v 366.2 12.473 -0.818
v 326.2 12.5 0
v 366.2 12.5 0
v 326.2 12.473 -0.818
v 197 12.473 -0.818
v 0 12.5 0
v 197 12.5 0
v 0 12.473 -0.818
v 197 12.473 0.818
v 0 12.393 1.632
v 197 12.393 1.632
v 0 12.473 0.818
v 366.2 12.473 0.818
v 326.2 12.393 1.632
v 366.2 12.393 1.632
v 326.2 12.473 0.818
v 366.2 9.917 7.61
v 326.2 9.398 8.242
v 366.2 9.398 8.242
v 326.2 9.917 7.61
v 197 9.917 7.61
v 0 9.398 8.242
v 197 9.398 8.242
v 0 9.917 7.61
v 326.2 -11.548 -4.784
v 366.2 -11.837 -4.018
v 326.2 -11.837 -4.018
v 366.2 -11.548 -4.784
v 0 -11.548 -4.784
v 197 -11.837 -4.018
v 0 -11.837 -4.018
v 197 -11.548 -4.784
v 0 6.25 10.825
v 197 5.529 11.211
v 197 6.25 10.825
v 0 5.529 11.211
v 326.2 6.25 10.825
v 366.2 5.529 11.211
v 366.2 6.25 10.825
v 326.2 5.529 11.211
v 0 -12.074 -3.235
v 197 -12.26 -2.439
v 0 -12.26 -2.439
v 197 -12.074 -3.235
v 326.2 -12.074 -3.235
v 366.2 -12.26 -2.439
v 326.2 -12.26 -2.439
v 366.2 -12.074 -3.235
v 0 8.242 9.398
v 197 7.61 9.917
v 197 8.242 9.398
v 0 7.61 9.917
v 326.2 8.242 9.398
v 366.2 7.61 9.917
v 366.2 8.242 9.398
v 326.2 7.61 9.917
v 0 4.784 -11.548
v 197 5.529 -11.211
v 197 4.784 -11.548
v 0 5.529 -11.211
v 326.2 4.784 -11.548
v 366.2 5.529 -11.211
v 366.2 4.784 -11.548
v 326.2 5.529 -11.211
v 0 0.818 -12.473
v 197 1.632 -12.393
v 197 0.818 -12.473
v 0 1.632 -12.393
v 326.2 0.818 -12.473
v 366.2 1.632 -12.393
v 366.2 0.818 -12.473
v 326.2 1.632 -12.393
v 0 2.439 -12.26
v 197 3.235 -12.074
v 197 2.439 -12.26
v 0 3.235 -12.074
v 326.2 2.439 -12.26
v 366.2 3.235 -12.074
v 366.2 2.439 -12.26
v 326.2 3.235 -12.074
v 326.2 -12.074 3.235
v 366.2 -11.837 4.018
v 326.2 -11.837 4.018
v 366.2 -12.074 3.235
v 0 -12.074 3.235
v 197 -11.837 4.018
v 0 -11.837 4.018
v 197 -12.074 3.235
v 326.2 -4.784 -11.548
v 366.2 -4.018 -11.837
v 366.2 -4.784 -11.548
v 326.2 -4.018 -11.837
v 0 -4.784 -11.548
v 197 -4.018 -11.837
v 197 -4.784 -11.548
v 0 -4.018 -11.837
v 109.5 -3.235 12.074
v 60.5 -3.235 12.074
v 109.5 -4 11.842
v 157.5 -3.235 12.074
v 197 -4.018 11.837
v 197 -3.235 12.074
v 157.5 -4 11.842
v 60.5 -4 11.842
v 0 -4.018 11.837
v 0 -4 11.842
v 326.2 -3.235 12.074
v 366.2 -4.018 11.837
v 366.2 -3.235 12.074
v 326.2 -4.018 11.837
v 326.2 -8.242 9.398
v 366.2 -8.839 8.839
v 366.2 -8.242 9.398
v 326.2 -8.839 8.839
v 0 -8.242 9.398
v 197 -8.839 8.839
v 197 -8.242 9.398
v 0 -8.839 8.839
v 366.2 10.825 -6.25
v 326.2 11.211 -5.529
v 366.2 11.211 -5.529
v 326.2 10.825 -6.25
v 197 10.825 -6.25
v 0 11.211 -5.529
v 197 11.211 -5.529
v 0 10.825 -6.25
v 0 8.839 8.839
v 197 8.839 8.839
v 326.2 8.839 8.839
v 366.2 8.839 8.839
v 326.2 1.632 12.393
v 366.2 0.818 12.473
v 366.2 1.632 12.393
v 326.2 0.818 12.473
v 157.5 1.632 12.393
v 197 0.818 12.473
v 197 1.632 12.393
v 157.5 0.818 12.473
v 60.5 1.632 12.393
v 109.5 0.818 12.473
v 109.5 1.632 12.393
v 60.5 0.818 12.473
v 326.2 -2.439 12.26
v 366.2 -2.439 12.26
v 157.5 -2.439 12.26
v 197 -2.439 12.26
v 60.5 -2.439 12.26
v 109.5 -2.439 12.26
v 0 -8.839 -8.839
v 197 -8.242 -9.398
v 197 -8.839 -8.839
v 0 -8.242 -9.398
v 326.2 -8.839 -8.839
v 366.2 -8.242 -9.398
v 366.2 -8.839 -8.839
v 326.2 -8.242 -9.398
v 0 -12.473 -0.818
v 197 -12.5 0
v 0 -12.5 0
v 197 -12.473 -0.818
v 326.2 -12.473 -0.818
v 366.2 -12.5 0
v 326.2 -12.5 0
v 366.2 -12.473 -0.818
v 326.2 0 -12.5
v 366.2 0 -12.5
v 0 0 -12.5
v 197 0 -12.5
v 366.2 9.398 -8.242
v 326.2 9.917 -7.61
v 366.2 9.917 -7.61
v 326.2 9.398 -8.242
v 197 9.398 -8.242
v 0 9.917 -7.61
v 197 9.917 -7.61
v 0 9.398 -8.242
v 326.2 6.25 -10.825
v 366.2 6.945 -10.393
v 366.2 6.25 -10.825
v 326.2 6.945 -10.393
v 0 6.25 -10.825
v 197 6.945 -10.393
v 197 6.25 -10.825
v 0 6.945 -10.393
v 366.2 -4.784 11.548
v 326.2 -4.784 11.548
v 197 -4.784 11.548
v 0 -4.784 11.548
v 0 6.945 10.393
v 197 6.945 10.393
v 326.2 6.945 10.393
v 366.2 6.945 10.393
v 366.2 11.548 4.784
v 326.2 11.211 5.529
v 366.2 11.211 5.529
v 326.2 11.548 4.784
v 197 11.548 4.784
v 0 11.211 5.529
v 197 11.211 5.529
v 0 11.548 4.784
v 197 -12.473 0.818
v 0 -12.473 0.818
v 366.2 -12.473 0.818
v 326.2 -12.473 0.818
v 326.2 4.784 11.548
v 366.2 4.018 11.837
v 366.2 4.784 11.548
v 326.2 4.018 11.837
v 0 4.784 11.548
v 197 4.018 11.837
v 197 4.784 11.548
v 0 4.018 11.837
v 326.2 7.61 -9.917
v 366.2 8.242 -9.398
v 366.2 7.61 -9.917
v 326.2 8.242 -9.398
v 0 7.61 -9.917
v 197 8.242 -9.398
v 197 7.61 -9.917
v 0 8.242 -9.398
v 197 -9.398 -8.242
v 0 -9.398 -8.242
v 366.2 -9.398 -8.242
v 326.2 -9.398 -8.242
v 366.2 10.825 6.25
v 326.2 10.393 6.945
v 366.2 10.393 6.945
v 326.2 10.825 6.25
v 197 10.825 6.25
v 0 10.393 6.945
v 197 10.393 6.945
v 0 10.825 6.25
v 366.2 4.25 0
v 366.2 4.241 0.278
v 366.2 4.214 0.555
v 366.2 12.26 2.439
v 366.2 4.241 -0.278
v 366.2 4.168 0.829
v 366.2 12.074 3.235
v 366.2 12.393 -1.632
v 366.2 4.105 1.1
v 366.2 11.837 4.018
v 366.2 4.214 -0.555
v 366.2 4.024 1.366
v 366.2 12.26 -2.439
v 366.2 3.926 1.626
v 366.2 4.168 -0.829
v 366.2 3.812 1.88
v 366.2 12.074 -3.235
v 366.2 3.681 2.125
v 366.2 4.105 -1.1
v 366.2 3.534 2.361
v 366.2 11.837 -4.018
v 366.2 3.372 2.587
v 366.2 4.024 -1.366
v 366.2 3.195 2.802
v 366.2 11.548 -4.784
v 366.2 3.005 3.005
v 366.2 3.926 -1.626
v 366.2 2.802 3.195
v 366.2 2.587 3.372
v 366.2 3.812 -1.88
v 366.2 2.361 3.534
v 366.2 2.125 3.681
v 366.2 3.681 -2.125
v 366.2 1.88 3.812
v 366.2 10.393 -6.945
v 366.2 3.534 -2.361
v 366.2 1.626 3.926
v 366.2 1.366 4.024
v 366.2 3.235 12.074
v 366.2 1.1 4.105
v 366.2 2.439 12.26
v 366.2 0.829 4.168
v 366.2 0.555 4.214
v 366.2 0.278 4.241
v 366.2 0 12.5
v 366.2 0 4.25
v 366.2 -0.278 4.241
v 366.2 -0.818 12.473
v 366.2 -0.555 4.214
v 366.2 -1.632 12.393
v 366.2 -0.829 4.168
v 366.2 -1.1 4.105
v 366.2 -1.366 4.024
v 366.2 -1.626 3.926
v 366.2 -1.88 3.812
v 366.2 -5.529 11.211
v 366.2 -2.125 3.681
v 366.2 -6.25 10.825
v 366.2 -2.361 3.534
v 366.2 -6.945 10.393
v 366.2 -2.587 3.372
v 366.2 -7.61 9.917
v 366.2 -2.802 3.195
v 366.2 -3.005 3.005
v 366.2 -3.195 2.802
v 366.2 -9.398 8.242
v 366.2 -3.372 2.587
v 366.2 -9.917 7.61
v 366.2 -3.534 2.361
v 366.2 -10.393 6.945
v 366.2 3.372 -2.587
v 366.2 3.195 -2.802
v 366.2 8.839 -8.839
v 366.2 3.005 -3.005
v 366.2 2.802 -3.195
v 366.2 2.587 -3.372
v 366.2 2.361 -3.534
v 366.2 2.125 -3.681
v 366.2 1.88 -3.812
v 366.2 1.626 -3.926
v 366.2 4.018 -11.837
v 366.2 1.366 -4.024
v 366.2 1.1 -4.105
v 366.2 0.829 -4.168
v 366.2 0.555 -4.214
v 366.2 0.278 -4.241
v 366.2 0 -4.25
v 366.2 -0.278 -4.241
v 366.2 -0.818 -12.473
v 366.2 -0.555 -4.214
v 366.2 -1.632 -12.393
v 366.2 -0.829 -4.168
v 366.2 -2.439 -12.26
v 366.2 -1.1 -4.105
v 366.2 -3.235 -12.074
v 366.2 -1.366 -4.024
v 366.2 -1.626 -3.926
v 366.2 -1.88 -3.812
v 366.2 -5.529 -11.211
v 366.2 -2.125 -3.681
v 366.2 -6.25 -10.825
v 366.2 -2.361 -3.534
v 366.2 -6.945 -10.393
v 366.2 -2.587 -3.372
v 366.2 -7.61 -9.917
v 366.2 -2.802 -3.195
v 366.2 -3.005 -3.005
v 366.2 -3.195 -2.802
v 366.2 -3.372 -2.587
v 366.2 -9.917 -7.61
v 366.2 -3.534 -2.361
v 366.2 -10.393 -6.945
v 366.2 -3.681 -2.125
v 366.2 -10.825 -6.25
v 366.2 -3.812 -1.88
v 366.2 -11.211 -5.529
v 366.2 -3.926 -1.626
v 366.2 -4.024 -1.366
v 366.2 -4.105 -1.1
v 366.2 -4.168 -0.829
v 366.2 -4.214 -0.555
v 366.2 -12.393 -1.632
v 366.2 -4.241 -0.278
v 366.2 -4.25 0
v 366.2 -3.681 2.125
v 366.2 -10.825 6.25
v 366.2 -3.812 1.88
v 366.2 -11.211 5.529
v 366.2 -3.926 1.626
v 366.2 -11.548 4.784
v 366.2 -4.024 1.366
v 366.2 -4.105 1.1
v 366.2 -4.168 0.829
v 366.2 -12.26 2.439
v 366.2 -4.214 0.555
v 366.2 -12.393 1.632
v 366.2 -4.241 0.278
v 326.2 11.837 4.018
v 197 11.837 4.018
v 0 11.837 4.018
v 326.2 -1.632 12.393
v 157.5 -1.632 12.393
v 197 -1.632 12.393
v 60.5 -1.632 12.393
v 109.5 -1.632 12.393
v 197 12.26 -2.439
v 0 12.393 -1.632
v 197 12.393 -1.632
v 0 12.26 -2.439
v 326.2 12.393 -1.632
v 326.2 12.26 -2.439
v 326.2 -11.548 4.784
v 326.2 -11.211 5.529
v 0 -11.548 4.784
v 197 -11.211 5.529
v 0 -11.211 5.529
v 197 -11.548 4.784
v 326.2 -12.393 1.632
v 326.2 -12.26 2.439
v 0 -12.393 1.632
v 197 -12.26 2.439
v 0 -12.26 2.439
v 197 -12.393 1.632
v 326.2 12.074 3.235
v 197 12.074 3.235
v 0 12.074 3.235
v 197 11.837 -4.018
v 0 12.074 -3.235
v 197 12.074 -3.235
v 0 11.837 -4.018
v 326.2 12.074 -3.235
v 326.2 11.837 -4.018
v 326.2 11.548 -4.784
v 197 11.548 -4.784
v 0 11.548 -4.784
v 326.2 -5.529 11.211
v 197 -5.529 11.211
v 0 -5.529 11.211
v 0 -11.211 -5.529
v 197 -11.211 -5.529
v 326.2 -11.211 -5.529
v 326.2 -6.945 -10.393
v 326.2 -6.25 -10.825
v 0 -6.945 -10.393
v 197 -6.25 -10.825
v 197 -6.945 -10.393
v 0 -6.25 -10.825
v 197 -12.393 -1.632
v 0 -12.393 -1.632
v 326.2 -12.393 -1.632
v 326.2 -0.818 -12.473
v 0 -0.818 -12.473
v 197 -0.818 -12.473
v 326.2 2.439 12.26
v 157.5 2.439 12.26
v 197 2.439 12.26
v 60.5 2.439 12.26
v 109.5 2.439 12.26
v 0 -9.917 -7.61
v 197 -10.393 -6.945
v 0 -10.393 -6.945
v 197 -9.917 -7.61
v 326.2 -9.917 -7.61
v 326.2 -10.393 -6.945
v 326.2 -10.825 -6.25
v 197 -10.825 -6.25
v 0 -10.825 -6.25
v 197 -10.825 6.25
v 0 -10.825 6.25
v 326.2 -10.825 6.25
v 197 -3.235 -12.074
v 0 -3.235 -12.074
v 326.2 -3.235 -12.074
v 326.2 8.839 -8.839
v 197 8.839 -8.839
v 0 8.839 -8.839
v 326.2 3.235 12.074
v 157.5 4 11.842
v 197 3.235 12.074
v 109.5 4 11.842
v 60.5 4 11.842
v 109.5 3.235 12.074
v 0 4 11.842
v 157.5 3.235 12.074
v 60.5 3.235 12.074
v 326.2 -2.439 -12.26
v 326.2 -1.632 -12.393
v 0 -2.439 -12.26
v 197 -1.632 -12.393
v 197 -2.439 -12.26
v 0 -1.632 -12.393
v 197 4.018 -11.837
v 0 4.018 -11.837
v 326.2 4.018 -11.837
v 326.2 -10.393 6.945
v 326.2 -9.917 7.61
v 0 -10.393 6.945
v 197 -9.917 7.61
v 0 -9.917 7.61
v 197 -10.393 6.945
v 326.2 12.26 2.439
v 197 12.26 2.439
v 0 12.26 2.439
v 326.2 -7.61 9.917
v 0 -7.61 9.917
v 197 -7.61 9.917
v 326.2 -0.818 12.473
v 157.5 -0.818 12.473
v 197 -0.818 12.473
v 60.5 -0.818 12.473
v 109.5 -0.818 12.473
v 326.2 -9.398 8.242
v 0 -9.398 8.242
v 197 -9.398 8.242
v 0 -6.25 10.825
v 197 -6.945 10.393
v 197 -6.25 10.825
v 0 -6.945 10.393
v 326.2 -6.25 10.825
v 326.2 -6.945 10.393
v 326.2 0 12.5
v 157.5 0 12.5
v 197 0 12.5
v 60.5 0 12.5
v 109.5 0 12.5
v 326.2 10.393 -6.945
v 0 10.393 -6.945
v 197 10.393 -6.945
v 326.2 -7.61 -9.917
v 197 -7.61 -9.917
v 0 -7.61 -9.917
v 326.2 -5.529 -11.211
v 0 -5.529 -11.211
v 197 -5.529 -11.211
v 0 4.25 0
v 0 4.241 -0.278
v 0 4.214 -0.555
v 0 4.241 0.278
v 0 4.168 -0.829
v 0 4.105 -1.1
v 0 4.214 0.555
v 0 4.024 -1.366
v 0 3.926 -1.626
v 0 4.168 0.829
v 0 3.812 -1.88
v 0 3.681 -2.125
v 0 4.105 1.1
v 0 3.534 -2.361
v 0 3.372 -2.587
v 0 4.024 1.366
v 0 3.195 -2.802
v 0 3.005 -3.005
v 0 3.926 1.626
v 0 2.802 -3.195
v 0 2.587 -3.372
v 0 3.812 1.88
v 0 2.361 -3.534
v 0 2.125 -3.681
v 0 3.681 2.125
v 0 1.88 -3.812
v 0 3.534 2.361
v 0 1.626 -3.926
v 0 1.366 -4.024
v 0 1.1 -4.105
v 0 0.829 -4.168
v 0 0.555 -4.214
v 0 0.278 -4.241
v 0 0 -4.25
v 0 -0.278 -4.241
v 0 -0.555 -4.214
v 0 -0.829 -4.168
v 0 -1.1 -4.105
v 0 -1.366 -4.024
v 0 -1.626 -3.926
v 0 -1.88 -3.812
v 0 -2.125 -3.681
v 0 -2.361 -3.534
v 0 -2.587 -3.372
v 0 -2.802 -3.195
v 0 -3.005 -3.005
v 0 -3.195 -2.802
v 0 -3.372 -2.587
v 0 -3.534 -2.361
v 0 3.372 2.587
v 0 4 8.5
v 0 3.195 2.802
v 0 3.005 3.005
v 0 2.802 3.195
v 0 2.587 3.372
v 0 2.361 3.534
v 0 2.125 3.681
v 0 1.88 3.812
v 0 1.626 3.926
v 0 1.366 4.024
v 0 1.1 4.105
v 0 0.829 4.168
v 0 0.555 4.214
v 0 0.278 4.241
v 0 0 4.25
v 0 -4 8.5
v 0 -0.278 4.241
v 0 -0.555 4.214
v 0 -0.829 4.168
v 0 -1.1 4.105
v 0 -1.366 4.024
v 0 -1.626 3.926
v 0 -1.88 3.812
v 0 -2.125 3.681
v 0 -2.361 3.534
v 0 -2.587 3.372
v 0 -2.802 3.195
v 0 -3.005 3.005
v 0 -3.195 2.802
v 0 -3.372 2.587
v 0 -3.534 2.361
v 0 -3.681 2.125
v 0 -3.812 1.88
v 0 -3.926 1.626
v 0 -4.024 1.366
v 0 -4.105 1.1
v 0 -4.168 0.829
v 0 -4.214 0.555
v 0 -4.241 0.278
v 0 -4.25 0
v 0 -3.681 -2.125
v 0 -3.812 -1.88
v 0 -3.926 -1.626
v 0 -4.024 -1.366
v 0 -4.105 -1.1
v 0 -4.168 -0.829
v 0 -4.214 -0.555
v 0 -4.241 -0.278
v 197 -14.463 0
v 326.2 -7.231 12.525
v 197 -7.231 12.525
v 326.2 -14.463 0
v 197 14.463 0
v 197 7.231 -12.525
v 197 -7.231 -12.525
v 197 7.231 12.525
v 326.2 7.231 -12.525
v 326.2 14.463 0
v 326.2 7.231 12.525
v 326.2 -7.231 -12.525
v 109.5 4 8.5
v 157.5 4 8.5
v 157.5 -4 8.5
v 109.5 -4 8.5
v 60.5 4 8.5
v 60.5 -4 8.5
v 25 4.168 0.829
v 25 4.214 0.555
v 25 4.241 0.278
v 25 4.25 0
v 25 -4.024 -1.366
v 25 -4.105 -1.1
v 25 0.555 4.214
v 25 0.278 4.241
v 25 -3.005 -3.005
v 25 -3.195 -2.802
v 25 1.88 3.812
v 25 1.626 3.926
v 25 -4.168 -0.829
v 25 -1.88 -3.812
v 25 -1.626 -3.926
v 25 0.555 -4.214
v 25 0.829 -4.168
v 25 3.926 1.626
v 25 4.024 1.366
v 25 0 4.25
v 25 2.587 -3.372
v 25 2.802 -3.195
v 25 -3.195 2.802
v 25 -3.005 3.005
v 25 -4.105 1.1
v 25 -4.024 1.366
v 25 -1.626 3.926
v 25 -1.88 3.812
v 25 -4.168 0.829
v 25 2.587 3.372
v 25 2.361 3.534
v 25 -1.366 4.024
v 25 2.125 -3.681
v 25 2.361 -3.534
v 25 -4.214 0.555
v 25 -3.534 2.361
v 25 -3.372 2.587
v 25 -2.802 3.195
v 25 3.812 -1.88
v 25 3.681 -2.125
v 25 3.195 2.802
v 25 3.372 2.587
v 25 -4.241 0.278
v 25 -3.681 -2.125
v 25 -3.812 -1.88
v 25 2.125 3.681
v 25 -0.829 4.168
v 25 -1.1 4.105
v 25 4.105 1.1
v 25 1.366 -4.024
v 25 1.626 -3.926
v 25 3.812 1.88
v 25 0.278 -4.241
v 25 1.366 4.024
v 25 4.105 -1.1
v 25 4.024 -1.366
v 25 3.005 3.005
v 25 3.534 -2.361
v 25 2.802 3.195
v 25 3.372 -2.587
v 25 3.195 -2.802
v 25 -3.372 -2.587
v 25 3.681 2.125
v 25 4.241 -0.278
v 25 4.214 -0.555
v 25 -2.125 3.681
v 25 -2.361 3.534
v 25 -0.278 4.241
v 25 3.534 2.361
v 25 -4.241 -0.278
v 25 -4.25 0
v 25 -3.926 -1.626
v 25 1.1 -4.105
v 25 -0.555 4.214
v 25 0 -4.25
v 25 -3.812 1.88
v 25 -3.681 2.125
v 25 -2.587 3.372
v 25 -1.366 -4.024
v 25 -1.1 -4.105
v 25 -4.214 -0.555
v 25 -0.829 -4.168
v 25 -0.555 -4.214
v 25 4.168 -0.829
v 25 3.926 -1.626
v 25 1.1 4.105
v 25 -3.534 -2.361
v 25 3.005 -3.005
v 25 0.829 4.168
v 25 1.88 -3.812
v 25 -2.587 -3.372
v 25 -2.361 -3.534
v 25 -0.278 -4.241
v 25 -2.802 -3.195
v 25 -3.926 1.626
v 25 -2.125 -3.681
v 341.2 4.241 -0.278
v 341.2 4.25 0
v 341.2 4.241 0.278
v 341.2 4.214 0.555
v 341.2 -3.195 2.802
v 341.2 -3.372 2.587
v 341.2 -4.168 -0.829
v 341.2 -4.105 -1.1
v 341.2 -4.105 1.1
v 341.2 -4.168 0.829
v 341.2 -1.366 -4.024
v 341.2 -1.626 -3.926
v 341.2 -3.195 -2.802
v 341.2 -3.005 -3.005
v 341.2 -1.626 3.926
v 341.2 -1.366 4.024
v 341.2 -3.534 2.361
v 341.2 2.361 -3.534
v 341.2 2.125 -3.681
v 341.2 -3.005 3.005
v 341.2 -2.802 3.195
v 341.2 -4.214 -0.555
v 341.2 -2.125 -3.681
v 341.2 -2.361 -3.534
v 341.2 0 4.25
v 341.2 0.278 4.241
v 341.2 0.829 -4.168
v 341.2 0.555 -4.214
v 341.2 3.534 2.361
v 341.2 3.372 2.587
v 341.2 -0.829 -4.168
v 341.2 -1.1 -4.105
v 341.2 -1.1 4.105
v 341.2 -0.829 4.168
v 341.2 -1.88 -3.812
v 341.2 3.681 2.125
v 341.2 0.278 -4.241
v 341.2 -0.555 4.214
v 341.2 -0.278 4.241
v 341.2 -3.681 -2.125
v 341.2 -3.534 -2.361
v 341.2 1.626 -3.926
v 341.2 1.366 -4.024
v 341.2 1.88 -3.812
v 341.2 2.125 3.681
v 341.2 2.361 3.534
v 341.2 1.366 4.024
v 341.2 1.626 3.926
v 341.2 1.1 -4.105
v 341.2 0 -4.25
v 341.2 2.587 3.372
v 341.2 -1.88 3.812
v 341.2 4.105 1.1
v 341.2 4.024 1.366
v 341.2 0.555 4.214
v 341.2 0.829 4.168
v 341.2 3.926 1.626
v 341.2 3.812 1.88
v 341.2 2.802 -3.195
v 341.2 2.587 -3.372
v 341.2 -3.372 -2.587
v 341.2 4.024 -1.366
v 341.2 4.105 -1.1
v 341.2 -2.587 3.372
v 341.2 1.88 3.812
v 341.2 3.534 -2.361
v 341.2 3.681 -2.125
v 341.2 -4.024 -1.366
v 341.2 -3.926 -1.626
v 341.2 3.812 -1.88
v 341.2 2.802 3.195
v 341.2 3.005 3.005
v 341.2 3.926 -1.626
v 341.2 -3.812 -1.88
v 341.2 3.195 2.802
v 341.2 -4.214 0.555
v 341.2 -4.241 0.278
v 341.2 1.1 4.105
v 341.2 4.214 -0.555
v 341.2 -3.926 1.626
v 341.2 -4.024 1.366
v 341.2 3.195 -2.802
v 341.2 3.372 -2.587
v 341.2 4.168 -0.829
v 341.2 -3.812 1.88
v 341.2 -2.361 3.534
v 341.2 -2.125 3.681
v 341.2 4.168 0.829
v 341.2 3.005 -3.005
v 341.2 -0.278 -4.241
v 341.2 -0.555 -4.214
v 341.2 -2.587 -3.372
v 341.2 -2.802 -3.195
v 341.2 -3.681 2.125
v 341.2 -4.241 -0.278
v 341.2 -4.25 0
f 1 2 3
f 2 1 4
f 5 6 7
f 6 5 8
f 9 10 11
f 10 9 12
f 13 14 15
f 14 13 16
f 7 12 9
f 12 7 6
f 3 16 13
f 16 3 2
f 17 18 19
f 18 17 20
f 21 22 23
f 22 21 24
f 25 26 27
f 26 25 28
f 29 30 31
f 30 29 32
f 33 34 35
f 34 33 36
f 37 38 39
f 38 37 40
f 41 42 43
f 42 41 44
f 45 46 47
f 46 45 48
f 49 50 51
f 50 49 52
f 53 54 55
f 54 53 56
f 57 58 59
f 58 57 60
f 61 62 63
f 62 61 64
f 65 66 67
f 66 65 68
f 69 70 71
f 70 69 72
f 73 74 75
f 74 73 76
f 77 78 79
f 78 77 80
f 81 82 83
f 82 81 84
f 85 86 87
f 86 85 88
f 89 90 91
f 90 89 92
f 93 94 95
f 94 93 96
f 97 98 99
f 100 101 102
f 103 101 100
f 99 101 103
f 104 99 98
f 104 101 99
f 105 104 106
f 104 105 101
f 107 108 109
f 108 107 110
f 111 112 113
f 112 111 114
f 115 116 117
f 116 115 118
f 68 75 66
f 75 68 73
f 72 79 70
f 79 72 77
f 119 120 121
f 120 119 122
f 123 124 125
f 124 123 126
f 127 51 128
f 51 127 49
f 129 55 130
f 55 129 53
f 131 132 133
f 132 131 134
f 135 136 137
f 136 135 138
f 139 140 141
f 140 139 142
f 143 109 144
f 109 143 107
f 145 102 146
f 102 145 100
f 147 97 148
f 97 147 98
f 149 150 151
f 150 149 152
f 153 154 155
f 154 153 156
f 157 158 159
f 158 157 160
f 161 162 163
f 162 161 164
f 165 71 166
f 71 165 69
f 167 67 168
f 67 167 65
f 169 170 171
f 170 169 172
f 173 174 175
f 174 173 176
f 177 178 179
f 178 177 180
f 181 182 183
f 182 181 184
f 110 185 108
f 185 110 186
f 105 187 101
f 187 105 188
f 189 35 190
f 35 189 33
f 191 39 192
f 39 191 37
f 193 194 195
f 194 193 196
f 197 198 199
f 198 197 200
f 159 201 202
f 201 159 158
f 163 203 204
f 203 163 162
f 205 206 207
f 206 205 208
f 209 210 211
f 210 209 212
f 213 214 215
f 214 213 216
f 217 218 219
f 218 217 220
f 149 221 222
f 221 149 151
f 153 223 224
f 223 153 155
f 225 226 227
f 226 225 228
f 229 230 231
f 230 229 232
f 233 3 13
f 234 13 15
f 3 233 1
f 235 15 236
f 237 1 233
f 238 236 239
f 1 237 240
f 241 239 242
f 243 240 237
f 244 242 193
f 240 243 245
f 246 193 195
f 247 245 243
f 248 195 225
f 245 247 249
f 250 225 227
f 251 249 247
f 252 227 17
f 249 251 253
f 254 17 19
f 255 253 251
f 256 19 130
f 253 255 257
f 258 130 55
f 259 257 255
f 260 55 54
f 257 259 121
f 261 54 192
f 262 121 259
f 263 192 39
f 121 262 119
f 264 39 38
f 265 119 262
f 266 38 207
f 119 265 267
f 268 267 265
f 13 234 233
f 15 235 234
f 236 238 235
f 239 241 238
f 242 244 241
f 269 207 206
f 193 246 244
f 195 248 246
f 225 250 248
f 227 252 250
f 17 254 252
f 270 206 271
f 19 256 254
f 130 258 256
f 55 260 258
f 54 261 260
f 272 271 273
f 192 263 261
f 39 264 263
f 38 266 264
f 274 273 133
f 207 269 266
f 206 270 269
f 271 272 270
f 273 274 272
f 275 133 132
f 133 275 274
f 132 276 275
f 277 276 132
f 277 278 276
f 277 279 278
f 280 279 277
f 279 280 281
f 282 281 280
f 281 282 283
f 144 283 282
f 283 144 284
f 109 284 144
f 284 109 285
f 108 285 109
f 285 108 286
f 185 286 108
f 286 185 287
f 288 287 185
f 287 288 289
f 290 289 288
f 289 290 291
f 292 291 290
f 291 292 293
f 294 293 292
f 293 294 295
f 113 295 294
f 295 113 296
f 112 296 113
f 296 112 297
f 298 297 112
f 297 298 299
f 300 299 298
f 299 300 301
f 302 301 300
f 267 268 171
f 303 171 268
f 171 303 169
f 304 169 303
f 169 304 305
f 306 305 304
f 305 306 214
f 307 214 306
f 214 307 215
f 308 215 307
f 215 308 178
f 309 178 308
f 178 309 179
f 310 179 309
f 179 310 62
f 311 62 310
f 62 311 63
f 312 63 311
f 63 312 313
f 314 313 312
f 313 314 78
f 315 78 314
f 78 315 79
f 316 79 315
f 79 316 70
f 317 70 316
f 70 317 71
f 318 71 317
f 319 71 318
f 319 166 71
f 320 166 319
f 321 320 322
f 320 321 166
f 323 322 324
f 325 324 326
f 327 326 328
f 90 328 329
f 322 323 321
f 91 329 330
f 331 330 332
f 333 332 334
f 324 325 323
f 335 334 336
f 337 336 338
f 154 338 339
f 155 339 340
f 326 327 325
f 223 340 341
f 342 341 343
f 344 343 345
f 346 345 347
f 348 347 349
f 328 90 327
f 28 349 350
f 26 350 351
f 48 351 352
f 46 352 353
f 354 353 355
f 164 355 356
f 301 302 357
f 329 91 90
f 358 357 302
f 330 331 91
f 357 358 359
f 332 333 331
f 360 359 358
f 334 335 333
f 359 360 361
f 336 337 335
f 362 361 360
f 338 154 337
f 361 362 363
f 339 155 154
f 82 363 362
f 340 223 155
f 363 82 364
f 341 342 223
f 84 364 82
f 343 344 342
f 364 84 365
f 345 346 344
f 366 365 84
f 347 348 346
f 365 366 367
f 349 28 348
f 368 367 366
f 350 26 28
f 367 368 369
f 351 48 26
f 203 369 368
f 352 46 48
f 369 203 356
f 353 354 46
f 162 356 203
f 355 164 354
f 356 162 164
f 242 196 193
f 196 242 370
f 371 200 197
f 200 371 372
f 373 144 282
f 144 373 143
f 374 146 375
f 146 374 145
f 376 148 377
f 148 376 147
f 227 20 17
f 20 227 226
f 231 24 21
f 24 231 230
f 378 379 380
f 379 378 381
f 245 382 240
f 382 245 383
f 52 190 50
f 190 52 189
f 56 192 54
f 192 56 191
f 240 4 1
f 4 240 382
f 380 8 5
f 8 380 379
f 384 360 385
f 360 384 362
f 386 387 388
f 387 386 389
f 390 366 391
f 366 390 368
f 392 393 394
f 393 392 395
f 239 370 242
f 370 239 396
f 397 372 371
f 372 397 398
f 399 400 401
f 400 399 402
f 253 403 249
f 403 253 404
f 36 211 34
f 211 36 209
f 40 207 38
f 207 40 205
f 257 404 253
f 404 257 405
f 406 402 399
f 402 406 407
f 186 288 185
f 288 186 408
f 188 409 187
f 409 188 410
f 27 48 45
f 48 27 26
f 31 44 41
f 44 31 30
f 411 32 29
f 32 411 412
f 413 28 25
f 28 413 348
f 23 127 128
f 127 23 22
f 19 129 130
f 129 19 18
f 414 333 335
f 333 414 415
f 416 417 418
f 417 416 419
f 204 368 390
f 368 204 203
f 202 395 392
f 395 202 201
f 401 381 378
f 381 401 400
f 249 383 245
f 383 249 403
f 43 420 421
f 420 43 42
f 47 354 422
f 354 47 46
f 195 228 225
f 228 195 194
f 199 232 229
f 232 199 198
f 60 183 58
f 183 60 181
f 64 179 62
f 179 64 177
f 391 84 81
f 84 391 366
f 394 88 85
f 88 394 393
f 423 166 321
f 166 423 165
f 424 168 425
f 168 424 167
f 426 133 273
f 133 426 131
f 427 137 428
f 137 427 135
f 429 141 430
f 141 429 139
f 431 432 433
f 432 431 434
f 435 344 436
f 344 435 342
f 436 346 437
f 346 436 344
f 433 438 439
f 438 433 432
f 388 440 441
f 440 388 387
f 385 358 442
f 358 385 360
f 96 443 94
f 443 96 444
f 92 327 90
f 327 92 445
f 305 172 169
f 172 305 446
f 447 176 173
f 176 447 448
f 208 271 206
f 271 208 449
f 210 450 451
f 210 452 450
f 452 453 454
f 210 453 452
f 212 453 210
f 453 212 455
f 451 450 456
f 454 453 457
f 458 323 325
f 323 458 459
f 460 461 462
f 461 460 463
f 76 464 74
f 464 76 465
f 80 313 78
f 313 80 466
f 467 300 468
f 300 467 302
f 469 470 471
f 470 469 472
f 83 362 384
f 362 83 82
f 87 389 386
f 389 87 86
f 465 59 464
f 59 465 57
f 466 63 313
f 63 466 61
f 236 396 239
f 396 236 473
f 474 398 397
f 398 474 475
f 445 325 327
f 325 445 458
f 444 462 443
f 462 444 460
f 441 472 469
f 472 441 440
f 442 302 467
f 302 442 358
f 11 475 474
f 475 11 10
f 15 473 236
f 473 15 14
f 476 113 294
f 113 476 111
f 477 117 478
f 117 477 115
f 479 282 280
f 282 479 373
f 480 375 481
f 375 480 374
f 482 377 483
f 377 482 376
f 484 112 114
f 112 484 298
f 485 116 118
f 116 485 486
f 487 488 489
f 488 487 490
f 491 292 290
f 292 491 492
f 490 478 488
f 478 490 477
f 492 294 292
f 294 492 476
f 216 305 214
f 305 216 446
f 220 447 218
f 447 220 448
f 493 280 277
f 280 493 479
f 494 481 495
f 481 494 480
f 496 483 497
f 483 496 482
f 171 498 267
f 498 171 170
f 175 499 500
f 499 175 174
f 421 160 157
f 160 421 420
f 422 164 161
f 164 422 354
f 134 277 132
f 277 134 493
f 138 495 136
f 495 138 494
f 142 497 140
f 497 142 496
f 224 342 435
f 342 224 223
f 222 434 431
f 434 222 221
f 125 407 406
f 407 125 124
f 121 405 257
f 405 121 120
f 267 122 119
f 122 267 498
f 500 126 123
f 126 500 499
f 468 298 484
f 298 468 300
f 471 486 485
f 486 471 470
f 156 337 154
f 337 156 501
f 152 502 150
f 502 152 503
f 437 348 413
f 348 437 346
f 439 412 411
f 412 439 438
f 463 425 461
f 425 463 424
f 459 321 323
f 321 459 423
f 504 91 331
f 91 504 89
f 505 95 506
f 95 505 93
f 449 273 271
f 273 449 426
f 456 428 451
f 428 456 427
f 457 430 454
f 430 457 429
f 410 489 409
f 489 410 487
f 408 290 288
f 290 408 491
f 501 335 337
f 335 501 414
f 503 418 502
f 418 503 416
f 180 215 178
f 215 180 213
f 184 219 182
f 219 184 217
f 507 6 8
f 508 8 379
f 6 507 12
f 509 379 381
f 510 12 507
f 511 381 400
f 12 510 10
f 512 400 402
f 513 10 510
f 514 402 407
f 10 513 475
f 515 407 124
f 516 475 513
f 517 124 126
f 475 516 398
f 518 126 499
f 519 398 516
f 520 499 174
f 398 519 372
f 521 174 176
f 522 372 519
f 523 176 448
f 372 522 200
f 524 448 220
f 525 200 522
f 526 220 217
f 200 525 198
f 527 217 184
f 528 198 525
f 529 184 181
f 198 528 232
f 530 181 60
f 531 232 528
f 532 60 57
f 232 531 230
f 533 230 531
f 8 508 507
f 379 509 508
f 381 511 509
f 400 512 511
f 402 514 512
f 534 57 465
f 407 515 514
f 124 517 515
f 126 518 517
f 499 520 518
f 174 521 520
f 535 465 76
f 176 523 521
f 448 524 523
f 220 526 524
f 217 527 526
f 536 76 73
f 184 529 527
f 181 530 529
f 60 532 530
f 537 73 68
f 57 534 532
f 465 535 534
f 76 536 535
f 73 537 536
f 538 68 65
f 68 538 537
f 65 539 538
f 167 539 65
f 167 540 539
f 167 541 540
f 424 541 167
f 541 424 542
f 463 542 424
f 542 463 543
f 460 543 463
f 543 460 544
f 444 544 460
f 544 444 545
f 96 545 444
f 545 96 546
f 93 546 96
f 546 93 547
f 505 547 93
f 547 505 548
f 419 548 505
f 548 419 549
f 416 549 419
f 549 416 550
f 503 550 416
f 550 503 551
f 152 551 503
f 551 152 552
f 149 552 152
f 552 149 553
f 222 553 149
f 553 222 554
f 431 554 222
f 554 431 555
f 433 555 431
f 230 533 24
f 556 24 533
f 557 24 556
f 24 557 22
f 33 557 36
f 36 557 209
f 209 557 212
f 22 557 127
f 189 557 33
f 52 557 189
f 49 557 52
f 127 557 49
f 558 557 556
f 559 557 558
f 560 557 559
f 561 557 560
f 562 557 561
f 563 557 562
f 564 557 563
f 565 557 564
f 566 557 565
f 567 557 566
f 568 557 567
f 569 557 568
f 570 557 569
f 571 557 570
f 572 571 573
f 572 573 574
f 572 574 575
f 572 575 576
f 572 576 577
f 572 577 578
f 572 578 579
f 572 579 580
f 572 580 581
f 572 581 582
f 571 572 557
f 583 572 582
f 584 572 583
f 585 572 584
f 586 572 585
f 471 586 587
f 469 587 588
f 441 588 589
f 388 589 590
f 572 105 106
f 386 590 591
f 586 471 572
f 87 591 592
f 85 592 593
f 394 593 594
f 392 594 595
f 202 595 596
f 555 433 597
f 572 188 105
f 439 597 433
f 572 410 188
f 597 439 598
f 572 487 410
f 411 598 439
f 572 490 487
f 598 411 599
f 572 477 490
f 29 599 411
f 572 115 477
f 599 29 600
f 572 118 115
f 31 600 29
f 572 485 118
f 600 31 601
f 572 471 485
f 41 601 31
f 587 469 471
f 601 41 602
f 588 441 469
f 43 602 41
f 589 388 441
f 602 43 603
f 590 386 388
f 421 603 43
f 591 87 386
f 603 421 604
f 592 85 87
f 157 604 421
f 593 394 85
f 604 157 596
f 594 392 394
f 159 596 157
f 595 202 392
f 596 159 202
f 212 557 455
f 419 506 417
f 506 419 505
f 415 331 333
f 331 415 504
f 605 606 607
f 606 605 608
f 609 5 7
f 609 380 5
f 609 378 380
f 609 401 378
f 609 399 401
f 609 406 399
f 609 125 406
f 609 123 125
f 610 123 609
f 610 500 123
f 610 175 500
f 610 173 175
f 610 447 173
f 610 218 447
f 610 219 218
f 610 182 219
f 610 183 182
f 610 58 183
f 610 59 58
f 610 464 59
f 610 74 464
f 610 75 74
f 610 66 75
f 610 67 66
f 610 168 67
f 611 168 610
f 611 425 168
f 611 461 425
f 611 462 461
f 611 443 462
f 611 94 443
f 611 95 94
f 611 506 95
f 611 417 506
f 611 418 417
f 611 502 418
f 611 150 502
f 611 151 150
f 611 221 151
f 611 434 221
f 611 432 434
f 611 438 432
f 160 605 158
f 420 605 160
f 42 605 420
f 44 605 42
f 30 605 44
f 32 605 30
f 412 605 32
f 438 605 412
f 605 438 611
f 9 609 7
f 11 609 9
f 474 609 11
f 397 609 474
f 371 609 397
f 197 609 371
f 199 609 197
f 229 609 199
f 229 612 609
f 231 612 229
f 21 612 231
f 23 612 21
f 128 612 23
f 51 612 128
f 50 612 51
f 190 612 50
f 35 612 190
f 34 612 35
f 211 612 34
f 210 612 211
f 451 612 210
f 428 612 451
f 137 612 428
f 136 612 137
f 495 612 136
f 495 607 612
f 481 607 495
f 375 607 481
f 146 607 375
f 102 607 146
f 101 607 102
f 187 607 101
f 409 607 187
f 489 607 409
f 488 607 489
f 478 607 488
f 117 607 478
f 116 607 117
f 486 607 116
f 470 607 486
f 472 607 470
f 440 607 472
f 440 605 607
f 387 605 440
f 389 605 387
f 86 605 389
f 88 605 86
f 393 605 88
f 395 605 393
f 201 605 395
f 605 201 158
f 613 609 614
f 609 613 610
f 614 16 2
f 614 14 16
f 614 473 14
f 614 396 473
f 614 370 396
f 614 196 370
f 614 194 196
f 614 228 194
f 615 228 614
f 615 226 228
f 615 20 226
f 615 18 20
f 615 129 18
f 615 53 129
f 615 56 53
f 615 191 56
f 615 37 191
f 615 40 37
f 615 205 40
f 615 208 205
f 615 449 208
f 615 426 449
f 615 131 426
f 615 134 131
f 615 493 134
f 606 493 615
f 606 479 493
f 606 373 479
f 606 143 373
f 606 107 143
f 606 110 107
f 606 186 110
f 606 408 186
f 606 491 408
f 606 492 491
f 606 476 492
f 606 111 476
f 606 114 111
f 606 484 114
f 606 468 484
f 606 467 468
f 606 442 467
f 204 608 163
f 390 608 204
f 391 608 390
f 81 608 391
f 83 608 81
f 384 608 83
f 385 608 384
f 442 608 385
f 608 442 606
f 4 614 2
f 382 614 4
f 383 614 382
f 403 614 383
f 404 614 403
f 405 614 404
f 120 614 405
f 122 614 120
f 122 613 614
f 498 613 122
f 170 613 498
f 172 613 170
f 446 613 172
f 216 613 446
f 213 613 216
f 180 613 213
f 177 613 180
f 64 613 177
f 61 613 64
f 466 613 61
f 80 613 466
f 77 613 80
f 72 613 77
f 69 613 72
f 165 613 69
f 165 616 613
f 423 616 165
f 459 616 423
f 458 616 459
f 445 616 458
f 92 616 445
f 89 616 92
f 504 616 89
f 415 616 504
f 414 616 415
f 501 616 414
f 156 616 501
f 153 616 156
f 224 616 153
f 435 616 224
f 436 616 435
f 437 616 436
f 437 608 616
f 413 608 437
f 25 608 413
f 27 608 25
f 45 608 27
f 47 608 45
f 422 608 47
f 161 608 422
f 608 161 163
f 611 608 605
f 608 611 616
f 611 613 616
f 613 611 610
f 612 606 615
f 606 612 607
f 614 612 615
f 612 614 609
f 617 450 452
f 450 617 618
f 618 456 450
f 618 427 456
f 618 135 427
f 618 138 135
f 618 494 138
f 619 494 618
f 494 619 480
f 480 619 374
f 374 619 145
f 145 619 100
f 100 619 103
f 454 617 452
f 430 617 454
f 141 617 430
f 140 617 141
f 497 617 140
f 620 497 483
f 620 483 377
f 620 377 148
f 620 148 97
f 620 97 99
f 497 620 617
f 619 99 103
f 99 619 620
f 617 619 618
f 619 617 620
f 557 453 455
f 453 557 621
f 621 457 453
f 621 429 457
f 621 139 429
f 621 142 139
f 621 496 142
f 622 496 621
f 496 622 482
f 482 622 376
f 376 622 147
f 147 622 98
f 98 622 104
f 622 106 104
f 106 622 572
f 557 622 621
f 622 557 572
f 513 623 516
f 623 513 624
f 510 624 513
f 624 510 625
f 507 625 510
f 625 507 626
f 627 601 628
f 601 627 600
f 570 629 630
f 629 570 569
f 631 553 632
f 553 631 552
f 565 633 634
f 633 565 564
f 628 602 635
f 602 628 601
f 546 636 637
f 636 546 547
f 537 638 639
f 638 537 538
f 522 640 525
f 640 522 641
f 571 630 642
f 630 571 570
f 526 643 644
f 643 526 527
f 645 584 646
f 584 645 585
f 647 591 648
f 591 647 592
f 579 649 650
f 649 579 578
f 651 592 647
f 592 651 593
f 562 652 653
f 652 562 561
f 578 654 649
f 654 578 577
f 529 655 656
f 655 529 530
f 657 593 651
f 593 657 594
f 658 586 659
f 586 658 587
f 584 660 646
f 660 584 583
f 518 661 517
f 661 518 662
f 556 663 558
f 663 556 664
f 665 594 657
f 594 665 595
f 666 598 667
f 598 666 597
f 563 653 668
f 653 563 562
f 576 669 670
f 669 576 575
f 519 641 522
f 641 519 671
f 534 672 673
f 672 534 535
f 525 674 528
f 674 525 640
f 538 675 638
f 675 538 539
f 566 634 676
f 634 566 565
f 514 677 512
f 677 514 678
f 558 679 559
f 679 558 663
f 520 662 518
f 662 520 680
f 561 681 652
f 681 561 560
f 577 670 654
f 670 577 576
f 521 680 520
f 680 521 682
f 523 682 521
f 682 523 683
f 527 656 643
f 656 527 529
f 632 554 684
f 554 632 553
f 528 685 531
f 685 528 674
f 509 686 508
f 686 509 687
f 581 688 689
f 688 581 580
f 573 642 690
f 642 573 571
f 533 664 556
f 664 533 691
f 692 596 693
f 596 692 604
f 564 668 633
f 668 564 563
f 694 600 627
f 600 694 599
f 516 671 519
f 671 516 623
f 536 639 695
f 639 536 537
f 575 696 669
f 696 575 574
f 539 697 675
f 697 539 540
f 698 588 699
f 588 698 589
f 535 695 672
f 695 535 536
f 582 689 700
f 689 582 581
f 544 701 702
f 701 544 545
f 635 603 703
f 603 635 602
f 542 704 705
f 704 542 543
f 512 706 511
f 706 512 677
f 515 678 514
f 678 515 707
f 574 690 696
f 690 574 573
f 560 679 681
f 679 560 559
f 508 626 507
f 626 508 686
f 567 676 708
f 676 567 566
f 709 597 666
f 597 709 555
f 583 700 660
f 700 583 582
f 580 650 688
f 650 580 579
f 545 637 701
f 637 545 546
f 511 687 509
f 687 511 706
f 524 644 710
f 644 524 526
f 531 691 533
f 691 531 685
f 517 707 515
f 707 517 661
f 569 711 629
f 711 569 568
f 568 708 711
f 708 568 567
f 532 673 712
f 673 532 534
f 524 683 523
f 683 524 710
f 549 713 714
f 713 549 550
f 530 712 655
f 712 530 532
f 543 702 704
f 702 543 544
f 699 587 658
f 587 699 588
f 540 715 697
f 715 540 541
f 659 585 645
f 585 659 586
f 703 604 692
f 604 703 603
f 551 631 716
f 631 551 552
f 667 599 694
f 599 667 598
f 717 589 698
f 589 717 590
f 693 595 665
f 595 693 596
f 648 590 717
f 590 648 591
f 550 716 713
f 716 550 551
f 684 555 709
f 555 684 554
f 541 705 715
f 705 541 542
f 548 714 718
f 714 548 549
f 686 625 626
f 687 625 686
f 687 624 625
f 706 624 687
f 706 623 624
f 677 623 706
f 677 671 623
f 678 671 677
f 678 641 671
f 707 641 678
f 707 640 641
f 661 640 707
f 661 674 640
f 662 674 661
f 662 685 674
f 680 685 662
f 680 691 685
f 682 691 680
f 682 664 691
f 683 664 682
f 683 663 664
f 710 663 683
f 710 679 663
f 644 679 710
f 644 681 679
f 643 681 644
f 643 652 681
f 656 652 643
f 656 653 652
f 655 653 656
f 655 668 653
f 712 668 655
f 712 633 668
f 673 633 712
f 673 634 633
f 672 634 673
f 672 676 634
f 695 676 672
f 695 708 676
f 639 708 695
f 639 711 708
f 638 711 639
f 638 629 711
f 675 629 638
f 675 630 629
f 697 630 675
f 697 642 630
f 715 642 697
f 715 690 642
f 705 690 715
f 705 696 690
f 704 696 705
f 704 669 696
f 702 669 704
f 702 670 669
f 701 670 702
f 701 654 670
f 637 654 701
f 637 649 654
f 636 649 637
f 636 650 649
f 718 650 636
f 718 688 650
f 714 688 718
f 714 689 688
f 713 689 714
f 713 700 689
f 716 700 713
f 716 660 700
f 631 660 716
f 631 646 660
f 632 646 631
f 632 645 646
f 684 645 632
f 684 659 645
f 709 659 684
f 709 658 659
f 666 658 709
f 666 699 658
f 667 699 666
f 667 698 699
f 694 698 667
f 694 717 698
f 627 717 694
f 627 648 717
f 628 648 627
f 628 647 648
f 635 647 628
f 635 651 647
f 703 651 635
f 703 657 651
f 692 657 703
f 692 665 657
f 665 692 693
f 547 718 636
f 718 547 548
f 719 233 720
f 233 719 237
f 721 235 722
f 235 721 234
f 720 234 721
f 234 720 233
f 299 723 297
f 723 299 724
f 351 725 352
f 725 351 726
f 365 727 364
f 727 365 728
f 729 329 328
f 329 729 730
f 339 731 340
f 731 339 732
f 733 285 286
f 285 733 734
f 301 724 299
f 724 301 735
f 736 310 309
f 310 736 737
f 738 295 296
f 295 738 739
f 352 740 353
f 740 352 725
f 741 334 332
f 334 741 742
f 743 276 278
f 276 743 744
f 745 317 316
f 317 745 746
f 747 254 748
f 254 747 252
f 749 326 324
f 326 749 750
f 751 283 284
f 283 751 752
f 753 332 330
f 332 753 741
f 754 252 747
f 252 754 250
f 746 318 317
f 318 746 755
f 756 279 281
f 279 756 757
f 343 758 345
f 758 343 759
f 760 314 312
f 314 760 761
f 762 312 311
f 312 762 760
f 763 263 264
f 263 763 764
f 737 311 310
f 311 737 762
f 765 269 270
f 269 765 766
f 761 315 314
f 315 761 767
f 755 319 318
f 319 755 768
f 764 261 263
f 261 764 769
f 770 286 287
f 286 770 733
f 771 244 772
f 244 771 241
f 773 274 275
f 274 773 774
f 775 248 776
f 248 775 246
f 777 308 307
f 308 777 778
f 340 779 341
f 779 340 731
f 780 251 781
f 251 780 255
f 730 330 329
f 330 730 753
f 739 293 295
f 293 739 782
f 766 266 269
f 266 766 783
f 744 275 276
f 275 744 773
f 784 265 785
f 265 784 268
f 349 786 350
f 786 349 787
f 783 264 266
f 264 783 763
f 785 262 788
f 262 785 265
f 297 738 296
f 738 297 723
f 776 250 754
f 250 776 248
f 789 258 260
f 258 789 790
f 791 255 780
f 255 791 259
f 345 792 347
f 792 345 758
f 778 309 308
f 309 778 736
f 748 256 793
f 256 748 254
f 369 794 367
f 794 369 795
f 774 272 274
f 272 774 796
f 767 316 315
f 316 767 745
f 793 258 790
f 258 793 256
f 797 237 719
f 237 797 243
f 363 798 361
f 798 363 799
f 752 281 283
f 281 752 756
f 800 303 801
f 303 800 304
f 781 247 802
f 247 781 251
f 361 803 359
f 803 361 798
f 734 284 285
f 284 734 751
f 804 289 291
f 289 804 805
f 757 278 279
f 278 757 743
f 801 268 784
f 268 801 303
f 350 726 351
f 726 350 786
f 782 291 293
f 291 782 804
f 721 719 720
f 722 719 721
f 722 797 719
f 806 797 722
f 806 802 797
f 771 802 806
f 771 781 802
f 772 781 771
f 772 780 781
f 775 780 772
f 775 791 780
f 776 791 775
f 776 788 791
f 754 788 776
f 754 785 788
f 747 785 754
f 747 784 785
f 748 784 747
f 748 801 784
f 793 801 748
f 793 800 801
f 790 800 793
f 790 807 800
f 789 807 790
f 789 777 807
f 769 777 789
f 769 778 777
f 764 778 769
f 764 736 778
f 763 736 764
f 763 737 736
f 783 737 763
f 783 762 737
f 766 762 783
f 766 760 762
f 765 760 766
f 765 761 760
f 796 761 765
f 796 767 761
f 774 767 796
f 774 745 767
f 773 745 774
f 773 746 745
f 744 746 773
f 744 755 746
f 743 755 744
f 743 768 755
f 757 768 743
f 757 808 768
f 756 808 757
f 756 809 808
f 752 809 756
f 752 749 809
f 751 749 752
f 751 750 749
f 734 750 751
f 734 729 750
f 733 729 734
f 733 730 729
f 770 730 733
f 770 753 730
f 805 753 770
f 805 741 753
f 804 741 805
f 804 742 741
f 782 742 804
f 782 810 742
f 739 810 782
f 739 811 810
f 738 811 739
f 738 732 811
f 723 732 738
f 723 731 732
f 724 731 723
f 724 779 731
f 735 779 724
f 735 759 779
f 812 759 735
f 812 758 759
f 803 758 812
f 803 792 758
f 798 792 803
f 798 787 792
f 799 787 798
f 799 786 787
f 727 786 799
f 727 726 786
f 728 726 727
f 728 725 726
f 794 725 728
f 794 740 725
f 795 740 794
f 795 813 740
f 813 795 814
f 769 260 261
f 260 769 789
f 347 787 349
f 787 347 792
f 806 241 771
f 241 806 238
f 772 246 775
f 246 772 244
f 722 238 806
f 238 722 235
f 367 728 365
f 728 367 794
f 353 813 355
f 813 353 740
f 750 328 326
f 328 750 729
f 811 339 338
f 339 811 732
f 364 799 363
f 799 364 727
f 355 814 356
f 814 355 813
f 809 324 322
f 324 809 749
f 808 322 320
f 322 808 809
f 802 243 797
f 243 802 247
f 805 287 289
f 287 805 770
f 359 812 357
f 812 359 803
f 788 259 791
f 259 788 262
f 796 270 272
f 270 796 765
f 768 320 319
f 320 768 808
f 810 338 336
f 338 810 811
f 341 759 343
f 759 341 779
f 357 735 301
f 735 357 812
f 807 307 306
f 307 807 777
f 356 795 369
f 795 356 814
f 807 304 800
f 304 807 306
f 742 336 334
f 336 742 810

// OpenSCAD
// file: params.scad
// GENERATED by design/build.py from design/params.py -- do not edit by hand.

C = 60.0;
N_SLOTS = 16.0;
T_BLADE = 8.0;
SIDE_CLEAR = 0.2;
T_SPACER = 8.4;
END_CLEAR = 0.5;
R_TIP = 34.0;
R_ROOT = 25.0;
TEETH = 3.0;
STAGGER_DEG = 15.0;
BLADE_VARIANTS = 4.0;
SPACER_OD = 50.0;
SPACER_BORE = 29.2;
HEX_AF = 25.05;
HEX_BORE_AF = 25.1;
HEX_RELIEF_D = 3.2;
JOURNAL_D = 25.0;
PLATE_H = 70.0;
PLATE_L = 170.0;
LAYER_T = 10.0;
INNER_HOLE_D = 36.0;
CAP_HOLE_D = 32.0;
SEAL_BORE_DEPTH = 7.0;
CAP_BORE_DEPTH = 7.0;
COLLAR_OD = 46.0;
COLLAR_T = 4.0;
SLEEVE_OD = 30.0;
SLEEVE_ID = 25.05;
COMB_W = 25.0;
COMB_GAP = 0.5;
COMB_SLOT_CLEAR = 0.5;
COMB_SLOT_PAST_TIP = 3.0;
COMB_SCREW_Y = 74.0;
WALL_H = 50.0;
WALL_GAP = 2.0;
END_WASHER_T = 10.0;
END_SCREW_LEN = 30.0;
PRINTER_X = 250.0;
PRINTER_Y = 210.0;
PRINTER_Z = 210.0;
PRINT_WALL = 3.0;
PRINT_FLANGE = 4.0;
HOPPER_TOP_Z = 305.0;
HOPPER_TOP_IN = 180.0;
HOPPER_SPLIT_Z = 105.0;
TOP_HOLE_Y = 10.0;
TOP_HOLE_DEPTH = 10.0;
WALL_TOP_HOLE_X = 30.0;
WALL_TOP_HOLE_Y = 71.0;
GUARD_HOLE_Y = 80.0;
GUARD_HOLE_Z = 9.0;
GUARD_CLEAR = 3.0;
BASE_T = 18.0;
WORM_AXIS_DROP = 63.0;
GROUND_Z = -368.0;
MOTOR_SHAFT_L = 40.0;
TL_B_CLEAR = 5.0;
HANDLE_W = 110.0;
HANDLE_H = 40.0;
HANDLE_BACK_T = 8.0;
HANDLE_LIP_D = 26.0;
HANDLE_Z = -200.0;
HANDLE_SCREW_DX = 35.0;
HANDLE_HOLE_D = 4.5;
INSERT_D = 5.6;
INSERT_DEPTH = 6.0;
DRF_GAP = 1.0;
SW_PAD_L = 92.0;
SW_PAD_W = 32.0;
SW_PAD_T = 10.0;
SW_SCREW_SPACING = 22.0;
INTERLOCK_IN = 12.0;
INTERLOCK_OUT_TRAVEL = 15.0;
CG_END_GAP = 1.0;
CG_FOOT_W = 36.0;
CG_FOOT_T = 4.0;
CG_FOOT_REACH = 16.0;
DECK_PLY_T = 18.0;
DECK_MARGIN = 30.0;
LEG_SECTION = 45.0;
STUB_D = 25.0;
STUB_L = 80.0;
STUB_END_D = 30.0;
STUB_END_L = 60.0;
STUB_FLAT_AF = 22.0;
STUB_FLAT_L = 40.0;
STUB_KEY_L = 70.0;
T_LIMIT = 63.25;
HOOK_DEG = 10.0;
TEST_PIN_D = 12.0;
TEST_PIN_R = 32.0;
TEST_PIN_PROJ = 9.0;
TEST_BLADE_GAP = 1.0;
TEST_LEVER_L = 540.0;
TEST_LEVER_W = 50.0;
TEST_LEVER_T = 10.0;
TEST_LEVER_PIVOT_END = 25.0;
TEST_LEVER_PIVOT_D = 25.2;
TEST_WEIGHT_ARM = 500.0;
TEST_WEIGHT_HOLE_D = 10.5;
TEST_WEIGHT_KG = 11.9;
TEST_BLADE_ROT = -30.0;
TEST_LEVER_DEG = 0.0;
T_SET = 55.0;
T_OPERATING = 45.0;
TL_SET_AT_TL = 55.0;
SUBPLATE_T = 20.0;
GB_BOX = [100.0, 100.0, 145.0];
GB_BELOW_OUT = 113.0;
GB_BOSS = 9.0;
GB_FOOT = [124.0, 76.0];
GB_FLANGE = [140.0, 100.0, 8.0];
GB_WORM_STUB = 40.0;
SPROCKET_T = 7.2;
SPROCKET_OD_EXTRA = 6.2;
SPROCKET_ROOT = 7.92;
CHAIN_ENV_W = 18.0;
CHAIN_ENV_H = 12.1;
DRIVE_LEG_MIN = 60.0;
PIN_N = 4.0;
PIN_D = 8.0;
PIN_L = 32.0;
PIN_R = 50.5;
PIN_HOLE_D = 8.5;
PF_D = 120.0;
PF_T = 12.0;
PF_GAP = 2.0;
PF_HUB_D = 50.0;
PF_POCKET_D = 36.0;
PF_POCKET_CLEAR = 2.0;
PF_KEY_L = 25.0;
PF_SHAFT_RECESS = 1.0;
DG_SEAM_Z = 0.0;
DG_FLANGE_W = 12.0;
DG_FLANGE_T = 4.0;
TLFIX_ARM = 500.0;
TLFIX_LEVER_L = 600.0;
TLFIX_LEVER_W = 50.0;
TLFIX_LEVER_T = 10.0;
TL_HUB_D = 42.0;
TL_FLANGE_T = 8.0;
TL_CM_OFFSET = 12.0;
TL_GB_GAP = 3.0;
TL_PACK_D = 70.0;
TL_PRESS_T = 8.0;
TL_SPRING_L = 26.0;
GB_HUB_L = 72.0;
OUT_SPACER_D = 36.0;
SHAFT_KEY_W = 8.0;
SHAFT_KEY_D = 4.0;
GB_KEY_END = 6.0;
TL_KEY_END = 3.0;
CIRCLIP_GROOVE_D = 23.9;
CIRCLIP_GROOVE_W = 1.3;
CIRCLIP_T = 1.2;
CIRCLIP_OD = 31.4;
CIRCLIP_EDGE = 3.0;
GB_RAIL_W = 50.0;
GB_RAIL_T = 10.0;
GB_RAIL_SLOT = 6.0;
GB_RAIL_BOLT_DX = 86.0;
GB_RAIL_END = 10.0;
GB_SPACER_L = 18.0;
DECK_RAIL_MARGIN = 20.0;
DECK_ANCHOR_D = 8.0;
DECK_ANGLE = [40.0, 40.0, 4.0];
DECK_ANGLE_L = 44.0;
DECK_ANGLE_DECK_BOLTS = 2.0;
DECK_ANGLE_LEG_BOLTS = 2.0;
FOOT_ANGLE_LEG_BOLTS = 2.0;
FOOT_ANGLE_ANCHORS = 2.0;
BIG_WASHER_D = 24.0;
BIG_WASHER_T = 2.0;
DECK_LEG_INSET_Y = 45.0;
TLFIX_PIN_L = 25.0;
TLFIX_LEVER_GAP = 5.0;
TLFIX_PIVOT_D = 25.2;
TLFIX_LUG = [20.0, 20.0];
TLFIX_LUG_GAP = 2.4;
SW_BODY = [31.0, 30.0, 90.0];
SW_HOLE_SPACING = 22.0;
SW_SLOT = [5.0, 23.0, 20.0];
ACT_SIZE = [12.0, 20.0, 50.0];
ACT_BLADE_T = 3.0;
ACT_BLADE_L = 20.0;
ACT_HOLE_SPACING = 20.0;
PILOT_D = 3.3;
PILOT_DEPTH = 8.0;
HSW_BODY = [42.0, 38.0, 112.0];
HSW_HOLE_SPACING = 22.0;
HSW_SLOT = [6.0, 24.0, 25.0];
HACT_SIZE = [15.0, 20.0, 68.0];
HACT_BLADE_T = 3.0;
HACT_BLADE_L = 22.0;
HACT_HOLE_SPACING = 30.0;
HSW_SCREW = [4.0, 4.5, 7.0, 3.0, 3.3];
HACT_SCREW = [5.0, 5.5, 8.5, 3.5, 4.2];
HSW_PAD_W = 48.0;
SCREEN_GAP = 2.0;
SCREEN_T = 10.0;
SCREEN_HOLE_D = 5.0;
SCREEN_HOLE_PITCH = 8.0;
SCREEN_HOLE_SLOPE = 50.0;
SCREEN_RELIEF_D = 6.5;
SCREEN_END_GAP = 0.5;
SCREEN_SCREW = [4.0, 4.5, 7.0, 4.0, 8.5];
SCREEN_SCREW_Y = 74.0;
SCREEN_TAP_DEPTH = 9.0;
SCREEN_SCREW_LAND = 8.0;
SCREEN_POCKET = [11.0, 6.0];
WALL_SCREW_HEAD = [8.5, 5.0];
BASE_CUT_Y = 83.0;
CPL_D = 54.0;
CPL_hub_L = 20.6;
CPL_gap = 12.7;
BEARING_name = "NA4905 needle roller bearing with inner ring";
BEARING_d = 25.0;
BEARING_D = 42.0;
BEARING_B = 17.0;
BEARING_F = 30.0;
BEARING_C = 23700.0;
BEARING_C0 = 20500.0;
GEAR_module = 4.0;
GEAR_z = 15.0;
GEAR_alpha = 20.0;
GEAR_bore = 25.0;
GEAR_hub_L = 18.0;
GEAR_cut_extra = 0.1;
GEAR_FACE = 30.0;
GEAR_HUB_L = 18.0;
GEAR_HUB_D = 45.0;
GEAR_SPACER_D = 30.0;
GEAR_KEY_W = 8.0;
GEAR_KEYWAY_H = 3.3;
GEAR_KEY_TOOL_D = 0.4;
OB_T = 10.0;
OB_H = 100.0;
OB_ZC = 3.0;
OB_L = 180.0;
OB_GAP = 2.0;
OB_STEP = 1.5;
PILLAR = [15.0, 60.0];
PILLAR_Y0 = 73.0;
TIE_D = 8.0;
TIE_WASHERS = 3.0;
HOOD_SCREW_PTS = [[76.0, 28.0], [76.0, -28.0], [-76.0, 28.0], [-76.0, -28.0]];
SEAL_d = 30.0;
SEAL_D = 42.0;
SEAL_B = 7.0;
THRUST_d = 30.0;
THRUST_D = 47.0;
THRUST_T = 4.0;
CRINKLE_d = 30.0;
CRINKLE_D = 39.0;
CRINKLE_n = 3.0;
CRINKLE_stack_h = 2.0;
TL_z = 30.0;
TL_L = 62.0;
TL_D = 89.0;
TL_T_min = 34.0;
TL_T_max = 149.0;
CHAIN_pitch = 12.7;
DECK_ANCHOR = "M8";

// derived
blades_per_shaft = 8.0;
stack_A = 131.2;
end_spacer_B = 8.2;
stack_B = 131.0;
chamber_L = 132.2;
overlap = 8.0;
tip_to_spacer = 1.0;
hex_AC = 28.9252;
bore_AC = 28.983;
bearing_x_drive = -18.5;
bearing_x_free = 150.7;
bearing_span = 169.2;
sleeve_L_drive = 10.5;
sleeve_L_free_A = 10.5;
sleeve_L_free_B = 10.7;
x_inner_ring_out_drive = -27.0;
x_cap_out_drive = -30.0;
collar_body_L_drive = 7.0;
x_collar_in_drive = -34.0;
x_collar_out_drive = -38.0;
gear_face = 30.0;
x_gear_in = -38.0;
x_gear_out = -68.0;
x_gear_hub_out = -86.0;
x_ob_in = -88.0;
x_ob_out = -108.0;
x_ob_ring_in = -89.5;
x_ob_ring_out = -106.5;
bearing_x_ob = -98.0;
gear_spacer_L = 3.5;
x_sprocket_in = -110.0;
ob_sleeve_L = 3.5;
x_spA_in = -135.0;
x_sprocket_out = -197.0;
x_cm = -185.0;
a_end_hub_L = 62.0;
ob_sleeve_A_L = 28.5;
standoff_L = 58.0;
x_sprocket_c = -166.0;
x_inner_ring_out_free = 159.2;
x_cap_out_free = 162.2;
collar_body_L_free = 9.0;
x_collar_in_free = 168.2;
x_collar_out_free = 172.2;
shaft_end_free = 170.7;
shaft_end_A_drive = -195.5;
shaft_end_B_drive = -108.5;
shaft_A_len = 366.2;
shaft_B_len = 279.2;
tl_sprocket_pd = 121.498;
sprocket_A_pd = 121.498;
tl_sprocket_root_d = 113.578;
hex_x0 = 1.5;
hex_x1 = 130.7;
gear_pitch_d = 60.0;
gear_od = 68.0;
gear_root_d_std = 50.0;
gear_root_d = 49.8;
gear_cut_depth = 9.1;
comb_edge_y = 55.5;
comb_slot_w = 9.0;
comb_slot_bottom_y = 67.0;
wall_inner_y = 66.0;

// blade torque test lever: computed from the blade outline (design/build.py, test_lever_numbers)
test_pin_Rmin = 30.9995;
test_pin_s = 1.4836;
test_pin_psi = 10.1718;
test_pin_contact_r = 32.54;
test_pin_clear = 0.1807;
hook_face_len = 4.546;
hook_face_end_r = 29.5336;
test_pin_off = -10.8544;
test_pin_edge_steel = 8.1456;
test_pin_ring_steel = 13.4;
test_pin_F = 1976.5625;
test_pin_sigma = 58.2555;
test_pin_deg = -19.8282;
test_face_nrm_deg = 70.0;
// file: common.scad
// common.scad -- shared include for every part file: parameters, blade profile, layout helpers.
// World frame: x along the shafts (x = 0 inner face of the drive-end plate), y across (A at -C/2, B at +C/2), z up.
include <params.scad>
include <blade_profile.scad>

FN = 96;                       // facets for round features (each module sets $fn = FN itself)
N_BLADES = N_SLOTS / 2;        // blades per shaft (= spacers per shaft)

// ---- local frame (u, v, w) -> world:  x = x0 + w,  y = u,  z = v   (a proper rotation)
// Used for everything that is "an axial part": w runs along the shaft, (u, v) = (y, z) across it.
module axial(x0 = 0)
    multmatrix([[0, 0, 1, x0], [1, 0, 0, 0], [0, 1, 0, 0], [0, 0, 0, 1]]) children();

// ---- layout of the cutting stacks
function shaft_y(sh)     = sh == "A" ? -C / 2 : C / 2;
function shaft_sign(sh)  = sh == "A" ? -1 : 1;                       // rotation direction about +x
function stack_x0(sh)    = END_CLEAR + (sh == "A" ? 0 : end_spacer_B); // x of the first blade
function blade_pitch()   = T_BLADE + T_SPACER;
function blade_x0(sh, k) = stack_x0(sh) + k * blade_pitch();         // blade k: x in [x0, x0 + T_BLADE]
function blade_xc(sh, k) = blade_x0(sh, k) + T_BLADE / 2;
function blade_variant(k) = k % BLADE_VARIANTS;
// rotation of blade k in its own 2D frame: j*60 - v*STAGGER, j = -floor(k/4)   (deg)
function blade_rot(k)    = -floor(k / BLADE_VARIANTS) * 60 - blade_variant(k) * STAGGER_DEG;
function sleeve_free_x0(sh) = END_CLEAR + (sh == "A" ? stack_A : stack_B);
function sleeve_free_L(sh)  = sh == "A" ? sleeve_L_free_A : sleeve_L_free_B;
function shaft_x_start(sh)  = sh == "A" ? shaft_end_A_drive : shaft_end_B_drive;
// y span of a comb bar: [lo, hi] (B on +y, A mirrored)
function comb_y_lo(sh) = sh == "B" ? comb_edge_y : -(comb_edge_y + COMB_W);
function comb_y_hi(sh) = sh == "B" ? comb_edge_y + COMB_W : -comb_edge_y;
// main file
// shaft.scad -- Ø25 shaft with a hex section (vertex at +y), gear / sprocket keyways (top, +z) and M10 end holes.
include <common.scad>

KEY_W = 8;
KEY_D = 4;
END_HOLE_D = 8.5;      // M10 tap drill
END_HOLE_L = 25;

module keyway(xa, xb) {
    // 8 wide x 4 deep from the Ø25 surface on the +z side; the cutter extends past the surface
    axial(xa) translate([-KEY_W / 2, JOURNAL_D / 2 - KEY_D, 0]) cube([KEY_W, KEY_D + 3, xb - xa]);
}

// Shaft with its axis on the x axis (y = z = 0), in world x positions. Rotates cleanly about its own axis.
// Keyways: the gear seat (the bought gear's whole bore, hub + teeth: x_gear_hub_out .. x_gear_in) on both shafts, the sprocket seat (x_sprocket_out .. x_spA_in) on A only.
module shaft_local(which) {
    $fn = FN;
    xs = shaft_x_start(which);
    difference() {
        union() {
            axial(xs) cylinder(d = JOURNAL_D, h = shaft_end_free - xs);
            // hex prism across flats HEX_AF; circle($fn=6) has a vertex on +u = +y
            axial(hex_x0) linear_extrude(hex_x1 - hex_x0) circle(d = HEX_AF / cos(30), $fn = 6);
        }
        keyway(x_gear_hub_out, x_gear_in);
        if (which == "A") keyway(x_sprocket_out, x_spA_in);
        axial(xs - 1) cylinder(d = END_HOLE_D, h = END_HOLE_L + 1);
        axial(shaft_end_free - END_HOLE_L) cylinder(d = END_HOLE_D, h = END_HOLE_L + 1);
    }
}

// In its world position (axis at y = -C/2 for A, +C/2 for B).
module shaft(which) translate([0, shaft_y(which), 0]) shaft_local(which);

// Part frame for export: axis along +X, starting at x = 0, axis on the X axis.
module shaft_part(which) translate([-shaft_x_start(which), 0, 0]) shaft_local(which);

// standalone render:  -D 'which="A"'
which = "A";
shaft_part(which);
